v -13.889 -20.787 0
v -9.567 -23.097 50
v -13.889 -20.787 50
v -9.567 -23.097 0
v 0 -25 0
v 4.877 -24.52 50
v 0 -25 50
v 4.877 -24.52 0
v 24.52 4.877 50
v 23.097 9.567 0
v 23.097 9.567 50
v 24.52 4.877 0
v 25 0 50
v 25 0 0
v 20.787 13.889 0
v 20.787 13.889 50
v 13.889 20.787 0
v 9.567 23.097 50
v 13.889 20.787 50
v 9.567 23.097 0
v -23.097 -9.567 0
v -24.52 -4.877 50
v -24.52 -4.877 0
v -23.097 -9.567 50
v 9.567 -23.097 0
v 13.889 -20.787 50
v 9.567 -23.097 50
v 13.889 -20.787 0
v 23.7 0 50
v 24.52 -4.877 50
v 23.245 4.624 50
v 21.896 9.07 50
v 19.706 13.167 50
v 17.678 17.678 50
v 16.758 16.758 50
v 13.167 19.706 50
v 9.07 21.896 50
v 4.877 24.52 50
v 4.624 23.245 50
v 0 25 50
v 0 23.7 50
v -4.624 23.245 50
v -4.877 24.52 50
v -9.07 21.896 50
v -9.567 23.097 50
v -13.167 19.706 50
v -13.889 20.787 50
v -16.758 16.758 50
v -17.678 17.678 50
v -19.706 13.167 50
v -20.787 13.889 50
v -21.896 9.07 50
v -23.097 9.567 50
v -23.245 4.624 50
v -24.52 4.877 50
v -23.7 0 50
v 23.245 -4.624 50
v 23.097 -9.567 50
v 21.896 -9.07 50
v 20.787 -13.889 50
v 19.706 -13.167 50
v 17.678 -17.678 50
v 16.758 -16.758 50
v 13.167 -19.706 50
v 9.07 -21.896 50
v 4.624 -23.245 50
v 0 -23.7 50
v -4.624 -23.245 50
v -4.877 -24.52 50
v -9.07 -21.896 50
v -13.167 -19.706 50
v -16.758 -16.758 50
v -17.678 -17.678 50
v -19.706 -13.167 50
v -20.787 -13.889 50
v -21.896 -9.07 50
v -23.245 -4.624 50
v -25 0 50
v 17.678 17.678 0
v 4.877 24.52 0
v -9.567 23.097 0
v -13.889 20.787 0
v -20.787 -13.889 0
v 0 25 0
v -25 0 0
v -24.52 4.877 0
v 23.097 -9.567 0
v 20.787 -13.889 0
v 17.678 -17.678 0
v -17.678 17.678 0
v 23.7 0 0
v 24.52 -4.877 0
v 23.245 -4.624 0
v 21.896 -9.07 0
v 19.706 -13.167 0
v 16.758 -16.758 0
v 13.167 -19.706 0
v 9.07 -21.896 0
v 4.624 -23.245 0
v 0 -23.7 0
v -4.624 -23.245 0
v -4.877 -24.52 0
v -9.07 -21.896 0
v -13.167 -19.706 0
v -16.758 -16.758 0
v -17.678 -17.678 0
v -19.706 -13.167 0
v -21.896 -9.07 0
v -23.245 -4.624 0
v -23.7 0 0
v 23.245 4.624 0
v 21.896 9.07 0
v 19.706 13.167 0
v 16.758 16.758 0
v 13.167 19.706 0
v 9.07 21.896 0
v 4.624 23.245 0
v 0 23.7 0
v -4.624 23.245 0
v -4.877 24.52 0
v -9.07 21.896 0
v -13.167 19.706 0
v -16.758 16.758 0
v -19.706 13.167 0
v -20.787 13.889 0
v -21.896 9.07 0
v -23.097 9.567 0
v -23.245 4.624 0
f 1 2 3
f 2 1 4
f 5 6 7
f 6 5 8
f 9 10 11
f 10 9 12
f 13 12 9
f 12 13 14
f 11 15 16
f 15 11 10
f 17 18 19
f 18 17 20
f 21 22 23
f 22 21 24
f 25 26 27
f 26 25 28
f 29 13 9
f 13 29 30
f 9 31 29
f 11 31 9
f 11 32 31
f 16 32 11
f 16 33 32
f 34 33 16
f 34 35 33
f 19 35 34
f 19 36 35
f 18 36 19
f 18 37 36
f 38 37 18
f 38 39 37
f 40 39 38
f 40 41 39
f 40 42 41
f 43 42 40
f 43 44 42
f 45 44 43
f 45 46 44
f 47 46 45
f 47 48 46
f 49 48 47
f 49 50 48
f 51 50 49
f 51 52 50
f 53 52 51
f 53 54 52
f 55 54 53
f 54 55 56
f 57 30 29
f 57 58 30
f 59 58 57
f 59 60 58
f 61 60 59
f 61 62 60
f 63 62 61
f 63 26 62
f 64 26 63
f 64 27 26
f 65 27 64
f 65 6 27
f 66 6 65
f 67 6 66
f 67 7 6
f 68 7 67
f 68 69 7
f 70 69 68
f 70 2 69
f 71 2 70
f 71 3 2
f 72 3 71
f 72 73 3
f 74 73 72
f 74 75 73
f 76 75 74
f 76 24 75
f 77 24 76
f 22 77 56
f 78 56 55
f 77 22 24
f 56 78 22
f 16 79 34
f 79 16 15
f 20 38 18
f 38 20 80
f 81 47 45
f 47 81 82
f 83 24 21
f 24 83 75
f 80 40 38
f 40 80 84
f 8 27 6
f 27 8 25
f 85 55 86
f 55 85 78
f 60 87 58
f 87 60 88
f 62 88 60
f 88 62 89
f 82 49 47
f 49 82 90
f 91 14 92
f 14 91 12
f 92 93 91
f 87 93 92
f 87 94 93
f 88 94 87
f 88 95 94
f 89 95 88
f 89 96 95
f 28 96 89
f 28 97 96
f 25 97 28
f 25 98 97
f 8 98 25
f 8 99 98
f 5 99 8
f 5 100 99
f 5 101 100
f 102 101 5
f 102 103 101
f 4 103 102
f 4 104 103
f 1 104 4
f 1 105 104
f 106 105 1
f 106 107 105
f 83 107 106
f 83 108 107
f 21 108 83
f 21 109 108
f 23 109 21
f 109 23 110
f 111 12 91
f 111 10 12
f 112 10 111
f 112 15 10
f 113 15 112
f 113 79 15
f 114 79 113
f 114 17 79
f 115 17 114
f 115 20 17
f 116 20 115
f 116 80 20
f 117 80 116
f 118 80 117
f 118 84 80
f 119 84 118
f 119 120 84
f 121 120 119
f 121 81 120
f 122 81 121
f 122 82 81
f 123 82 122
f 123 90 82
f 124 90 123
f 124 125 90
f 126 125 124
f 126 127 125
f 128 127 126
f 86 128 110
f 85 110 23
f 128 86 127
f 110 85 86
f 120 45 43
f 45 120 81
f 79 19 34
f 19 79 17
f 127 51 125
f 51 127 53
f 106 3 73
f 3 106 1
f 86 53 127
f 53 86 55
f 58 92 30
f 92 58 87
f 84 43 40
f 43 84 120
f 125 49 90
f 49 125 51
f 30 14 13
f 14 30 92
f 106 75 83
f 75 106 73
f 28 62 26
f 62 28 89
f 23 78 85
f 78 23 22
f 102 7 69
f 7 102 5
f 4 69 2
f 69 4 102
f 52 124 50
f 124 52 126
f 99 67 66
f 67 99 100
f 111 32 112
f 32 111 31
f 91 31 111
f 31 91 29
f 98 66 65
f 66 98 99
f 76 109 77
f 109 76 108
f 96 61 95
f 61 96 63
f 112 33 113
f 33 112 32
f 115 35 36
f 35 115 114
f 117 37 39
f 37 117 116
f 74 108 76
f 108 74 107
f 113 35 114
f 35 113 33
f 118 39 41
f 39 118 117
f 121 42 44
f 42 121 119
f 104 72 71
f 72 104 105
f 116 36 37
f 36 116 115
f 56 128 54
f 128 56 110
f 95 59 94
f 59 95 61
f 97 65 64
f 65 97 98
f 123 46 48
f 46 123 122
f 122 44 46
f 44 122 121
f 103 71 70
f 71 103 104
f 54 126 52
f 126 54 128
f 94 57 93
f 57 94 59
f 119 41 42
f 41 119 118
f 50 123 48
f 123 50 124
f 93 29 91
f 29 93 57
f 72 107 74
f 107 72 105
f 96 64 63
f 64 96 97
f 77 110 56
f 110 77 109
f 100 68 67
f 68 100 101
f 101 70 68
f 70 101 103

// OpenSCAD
$fn = 32;

// ----------------------------------------------------------------------
// Thin tube: 1.3 mm wall
// ----------------------------------------------------------------------

// --- parameters (mm) ---
tube_od = 50;             // outer diameter
tube_h = 50;              // height, Z
wall = 1.3;               // wall thickness

difference() {
  cylinder(h = tube_h, d = tube_od);
  translate([0, 0, -1]) cylinder(h = tube_h + 2, d = tube_od - 2 * wall);
}
